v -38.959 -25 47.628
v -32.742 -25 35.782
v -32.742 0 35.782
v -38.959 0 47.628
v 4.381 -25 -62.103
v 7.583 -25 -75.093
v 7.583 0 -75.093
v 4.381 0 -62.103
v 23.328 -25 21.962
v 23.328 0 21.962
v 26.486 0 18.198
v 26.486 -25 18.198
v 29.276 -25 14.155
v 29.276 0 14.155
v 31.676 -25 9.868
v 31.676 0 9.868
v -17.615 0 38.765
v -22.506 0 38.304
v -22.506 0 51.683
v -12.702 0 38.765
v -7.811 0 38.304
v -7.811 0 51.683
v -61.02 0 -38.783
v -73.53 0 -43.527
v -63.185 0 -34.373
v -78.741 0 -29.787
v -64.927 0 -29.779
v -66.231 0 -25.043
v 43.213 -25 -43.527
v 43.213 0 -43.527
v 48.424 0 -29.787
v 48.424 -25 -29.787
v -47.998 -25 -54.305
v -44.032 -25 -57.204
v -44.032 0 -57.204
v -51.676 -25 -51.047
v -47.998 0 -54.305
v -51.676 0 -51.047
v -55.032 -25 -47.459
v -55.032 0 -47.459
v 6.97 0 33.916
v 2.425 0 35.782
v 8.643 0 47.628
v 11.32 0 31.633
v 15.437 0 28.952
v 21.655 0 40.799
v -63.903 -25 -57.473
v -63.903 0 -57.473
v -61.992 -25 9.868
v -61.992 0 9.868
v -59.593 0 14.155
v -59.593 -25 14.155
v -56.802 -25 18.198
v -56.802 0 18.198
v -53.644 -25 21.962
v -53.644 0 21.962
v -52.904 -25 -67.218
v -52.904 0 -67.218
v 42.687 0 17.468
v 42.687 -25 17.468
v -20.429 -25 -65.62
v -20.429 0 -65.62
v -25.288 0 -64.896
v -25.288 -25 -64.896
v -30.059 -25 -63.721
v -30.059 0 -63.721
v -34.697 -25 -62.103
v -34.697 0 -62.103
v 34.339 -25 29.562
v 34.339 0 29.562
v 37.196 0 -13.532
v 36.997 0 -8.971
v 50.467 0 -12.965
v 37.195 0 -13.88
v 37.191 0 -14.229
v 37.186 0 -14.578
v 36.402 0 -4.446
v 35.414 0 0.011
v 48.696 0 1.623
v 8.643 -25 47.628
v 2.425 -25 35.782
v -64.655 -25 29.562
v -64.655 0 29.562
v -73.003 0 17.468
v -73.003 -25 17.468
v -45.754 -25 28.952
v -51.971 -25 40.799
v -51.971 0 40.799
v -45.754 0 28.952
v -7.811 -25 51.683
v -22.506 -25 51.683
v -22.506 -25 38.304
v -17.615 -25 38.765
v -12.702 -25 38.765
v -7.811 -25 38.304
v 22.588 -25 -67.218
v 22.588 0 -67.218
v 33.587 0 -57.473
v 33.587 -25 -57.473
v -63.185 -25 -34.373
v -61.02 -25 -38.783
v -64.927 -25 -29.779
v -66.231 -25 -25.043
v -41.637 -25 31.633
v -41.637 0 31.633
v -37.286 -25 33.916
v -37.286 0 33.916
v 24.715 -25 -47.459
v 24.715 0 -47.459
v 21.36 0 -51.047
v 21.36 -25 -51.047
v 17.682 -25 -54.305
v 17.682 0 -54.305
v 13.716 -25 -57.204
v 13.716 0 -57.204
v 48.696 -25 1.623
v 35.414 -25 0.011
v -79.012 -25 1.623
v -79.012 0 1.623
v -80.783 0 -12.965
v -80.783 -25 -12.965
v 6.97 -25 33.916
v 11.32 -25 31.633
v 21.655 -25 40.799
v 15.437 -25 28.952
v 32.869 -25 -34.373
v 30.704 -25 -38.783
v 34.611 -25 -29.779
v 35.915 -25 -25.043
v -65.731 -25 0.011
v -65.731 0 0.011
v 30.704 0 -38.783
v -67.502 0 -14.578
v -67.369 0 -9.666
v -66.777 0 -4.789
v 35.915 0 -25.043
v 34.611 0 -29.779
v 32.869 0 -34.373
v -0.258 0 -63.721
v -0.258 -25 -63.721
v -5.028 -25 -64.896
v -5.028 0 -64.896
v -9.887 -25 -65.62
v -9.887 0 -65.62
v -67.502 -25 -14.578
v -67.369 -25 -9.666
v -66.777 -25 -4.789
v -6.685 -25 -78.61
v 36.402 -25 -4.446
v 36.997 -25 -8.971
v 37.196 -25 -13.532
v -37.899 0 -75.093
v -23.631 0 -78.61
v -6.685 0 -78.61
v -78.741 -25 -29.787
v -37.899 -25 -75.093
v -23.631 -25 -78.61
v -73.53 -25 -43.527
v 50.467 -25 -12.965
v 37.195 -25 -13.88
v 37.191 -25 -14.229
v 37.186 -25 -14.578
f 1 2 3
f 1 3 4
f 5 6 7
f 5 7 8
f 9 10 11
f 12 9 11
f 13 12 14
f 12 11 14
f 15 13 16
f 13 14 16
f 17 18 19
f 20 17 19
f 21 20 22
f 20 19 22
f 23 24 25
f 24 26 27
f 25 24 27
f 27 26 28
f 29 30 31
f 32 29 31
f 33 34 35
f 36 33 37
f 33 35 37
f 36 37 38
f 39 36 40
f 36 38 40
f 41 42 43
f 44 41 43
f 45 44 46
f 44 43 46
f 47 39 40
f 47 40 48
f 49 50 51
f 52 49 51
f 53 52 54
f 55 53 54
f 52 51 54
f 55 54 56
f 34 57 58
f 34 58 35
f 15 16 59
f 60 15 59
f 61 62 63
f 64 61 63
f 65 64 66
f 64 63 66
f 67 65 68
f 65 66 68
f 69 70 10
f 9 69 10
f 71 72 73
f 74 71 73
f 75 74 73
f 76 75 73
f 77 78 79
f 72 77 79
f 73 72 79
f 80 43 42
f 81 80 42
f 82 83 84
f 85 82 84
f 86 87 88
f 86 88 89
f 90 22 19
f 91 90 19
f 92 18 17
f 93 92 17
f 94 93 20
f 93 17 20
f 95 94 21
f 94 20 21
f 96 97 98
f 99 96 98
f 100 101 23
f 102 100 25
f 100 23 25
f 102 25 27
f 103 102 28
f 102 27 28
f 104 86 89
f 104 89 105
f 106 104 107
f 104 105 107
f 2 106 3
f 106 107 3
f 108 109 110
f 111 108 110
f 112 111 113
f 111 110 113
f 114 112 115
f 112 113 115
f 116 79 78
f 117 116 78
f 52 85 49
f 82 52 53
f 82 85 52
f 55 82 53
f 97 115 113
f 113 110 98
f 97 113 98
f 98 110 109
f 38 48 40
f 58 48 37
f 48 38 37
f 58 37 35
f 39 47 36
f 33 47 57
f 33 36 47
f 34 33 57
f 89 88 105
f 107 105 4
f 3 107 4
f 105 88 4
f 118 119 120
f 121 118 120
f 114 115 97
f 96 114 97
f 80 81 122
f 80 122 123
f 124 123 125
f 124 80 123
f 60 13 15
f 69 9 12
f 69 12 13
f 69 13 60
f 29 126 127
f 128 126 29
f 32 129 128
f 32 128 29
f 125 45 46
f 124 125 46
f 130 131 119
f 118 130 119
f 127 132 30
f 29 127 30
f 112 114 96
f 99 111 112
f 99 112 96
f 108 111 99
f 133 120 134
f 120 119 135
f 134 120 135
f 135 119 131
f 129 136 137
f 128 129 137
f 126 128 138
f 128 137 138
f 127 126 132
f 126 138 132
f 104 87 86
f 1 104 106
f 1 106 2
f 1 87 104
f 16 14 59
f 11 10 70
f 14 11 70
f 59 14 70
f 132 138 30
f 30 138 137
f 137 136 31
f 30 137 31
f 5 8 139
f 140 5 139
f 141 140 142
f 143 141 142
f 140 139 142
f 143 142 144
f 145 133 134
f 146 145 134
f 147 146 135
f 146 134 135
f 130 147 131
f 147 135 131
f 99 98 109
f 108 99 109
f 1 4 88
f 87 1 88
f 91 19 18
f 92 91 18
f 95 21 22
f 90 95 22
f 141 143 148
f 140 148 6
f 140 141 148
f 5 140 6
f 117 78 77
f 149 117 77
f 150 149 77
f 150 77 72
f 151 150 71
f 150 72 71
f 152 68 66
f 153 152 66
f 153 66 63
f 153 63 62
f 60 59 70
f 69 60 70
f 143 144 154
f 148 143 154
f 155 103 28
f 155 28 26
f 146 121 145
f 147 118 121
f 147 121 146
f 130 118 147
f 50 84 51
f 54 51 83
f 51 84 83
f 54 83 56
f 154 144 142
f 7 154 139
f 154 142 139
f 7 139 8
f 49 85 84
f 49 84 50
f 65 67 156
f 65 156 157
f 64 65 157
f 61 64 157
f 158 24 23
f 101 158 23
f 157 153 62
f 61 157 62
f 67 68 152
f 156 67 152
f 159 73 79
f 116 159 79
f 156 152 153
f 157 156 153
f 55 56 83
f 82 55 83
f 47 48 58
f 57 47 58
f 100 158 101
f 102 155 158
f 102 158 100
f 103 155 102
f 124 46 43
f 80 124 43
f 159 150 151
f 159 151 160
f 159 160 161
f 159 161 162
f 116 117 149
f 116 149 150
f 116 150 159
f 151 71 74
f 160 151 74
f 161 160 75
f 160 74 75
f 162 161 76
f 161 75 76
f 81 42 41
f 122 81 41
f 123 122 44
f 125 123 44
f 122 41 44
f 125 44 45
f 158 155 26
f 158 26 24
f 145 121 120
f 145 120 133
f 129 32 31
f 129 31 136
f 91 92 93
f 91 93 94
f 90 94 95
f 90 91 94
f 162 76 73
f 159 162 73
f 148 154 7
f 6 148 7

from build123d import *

# Parameters (mm, degrees)
F1_DEPTH = 25


with BuildPart() as f1:
    # F0 (on Front) → F1 (new body)
    with BuildSketch(Plane.XZ):
        with BuildLine():
            ThreePointArc((23.328151, 21.961595), (27.928518, 16.208969), (31.676004, 9.867642))
            Line((31.676004, 9.867642), (42.686665, 17.467753))
            Line((42.686665, 17.467753), (34.338812, 29.561705))
            Line((34.338812, 29.561705), (23.328151, 21.961595))
        make_face()
        with BuildLine():
            ThreePointArc((2.42527, 35.781531), (9.172071, 32.82573), (15.437267, 28.952308))
            Line((15.437267, 28.952308), (21.654776, 40.798781))
            Line((21.654776, 40.798781), (8.642779, 47.628004))
            Line((8.642779, 47.628004), (2.42527, 35.781531))
        make_face()
        with BuildLine():
            ThreePointArc((-22.505756, 38.304423), (-15.158131, 38.822587), (-7.810507, 38.304423))
            Line((-7.810507, 38.304423), (-7.810507, 51.683375))
            Line((-7.810507, 51.683375), (-22.505756, 51.683375))
            Line((-22.505756, 51.683375), (-22.505756, 38.304423))
        make_face()
        with BuildLine():
            ThreePointArc((-45.75353, 28.952308), (-39.488334, 32.82573), (-32.741533, 35.781531))
            Line((-32.741533, 35.781531), (-38.959042, 47.628004))
            Line((-38.959042, 47.628004), (-51.971039, 40.798781))
            Line((-51.971039, 40.798781), (-45.75353, 28.952308))
        make_face()
        with BuildLine():
            ThreePointArc((-61.992267, 9.867642), (-58.244781, 16.208969), (-53.644414, 21.961595))
            Line((-53.644414, 21.961595), (-64.655075, 29.561705))
            Line((-64.655075, 29.561705), (-73.002928, 17.467753))
            Line((-73.002928, 17.467753), (-61.992267, 9.867642))
        make_face()
        with BuildLine():
            ThreePointArc((-67.501867, -14.577508), (-67.130595, -7.220998), (-65.730551, 0.010596))
            Line((-65.730551, 0.010596), (-79.011955, 1.623251))
            Line((-79.011955, 1.623251), (-80.783271, -12.964853))
            Line((-80.783271, -12.964853), (-67.501867, -14.577508))
        make_face()
        with BuildLine():
            Line((-73.529686, -43.527294), (-61.020149, -38.783052))
            ThreePointArc((-61.020149, -38.783052), (-64.110144, -32.096647), (-66.231156, -25.042756))
            Line((-66.231156, -25.042756), (-78.740693, -29.786997))
            Line((-78.740693, -29.786997), (-73.529686, -43.527294))
        make_face()
        with BuildLine():
            Line((-52.903881, -67.218082), (-44.031995, -57.203793))
            ThreePointArc((-44.031995, -57.203793), (-49.875377, -52.719267), (-55.031547, -47.45904))
            Line((-55.031547, -47.45904), (-63.903433, -57.473329))
            Line((-63.903433, -57.473329), (-52.903881, -67.218082))
        make_face()
        with BuildLine():
            Line((-23.63098, -78.609943), (-20.429187, -65.619759))
            ThreePointArc((-20.429187, -65.619759), (-27.687308, -64.364465), (-34.697419, -62.102956))
            Line((-34.697419, -62.102956), (-37.899212, -75.09314))
            Line((-37.899212, -75.09314), (-23.63098, -78.609943))
        make_face()
        with BuildLine():
            Line((7.582949, -75.09314), (4.381156, -62.102956))
            ThreePointArc((4.381156, -62.102956), (-2.628955, -64.364465), (-9.887076, -65.619759))
            Line((-9.887076, -65.619759), (-6.685283, -78.609943))
            Line((-6.685283, -78.609943), (7.582949, -75.09314))
        make_face()
        with BuildLine():
            Line((33.58717, -57.473329), (24.715284, -47.45904))
            ThreePointArc((24.715284, -47.45904), (19.559114, -52.719267), (13.715732, -57.203793))
            Line((13.715732, -57.203793), (22.587618, -67.218082))
            Line((22.587618, -67.218082), (33.58717, -57.473329))
        make_face()
        with BuildLine():
            Line((48.42443, -29.786997), (35.914893, -25.042756))
            ThreePointArc((35.914893, -25.042756), (33.793881, -32.096647), (30.703886, -38.783052))
            Line((30.703886, -38.783052), (43.213423, -43.527294))
            Line((43.213423, -43.527294), (48.42443, -29.786997))
        make_face()
        with BuildLine():
            ThreePointArc((35.414288, 0.010596), (36.7487, -6.702145), (37.196053, -13.531598))
            ThreePointArc((37.196053, -13.531598), (37.193441, -14.054579), (37.185604, -14.577508))
            Line((37.185604, -14.577508), (50.467008, -12.964853))
            Line((50.467008, -12.964853), (48.695692, 1.623251))
            Line((48.695692, 1.623251), (35.414288, 0.010596))
        make_face()
    extrude(amount=F1_DEPTH)


solid = f1.part
